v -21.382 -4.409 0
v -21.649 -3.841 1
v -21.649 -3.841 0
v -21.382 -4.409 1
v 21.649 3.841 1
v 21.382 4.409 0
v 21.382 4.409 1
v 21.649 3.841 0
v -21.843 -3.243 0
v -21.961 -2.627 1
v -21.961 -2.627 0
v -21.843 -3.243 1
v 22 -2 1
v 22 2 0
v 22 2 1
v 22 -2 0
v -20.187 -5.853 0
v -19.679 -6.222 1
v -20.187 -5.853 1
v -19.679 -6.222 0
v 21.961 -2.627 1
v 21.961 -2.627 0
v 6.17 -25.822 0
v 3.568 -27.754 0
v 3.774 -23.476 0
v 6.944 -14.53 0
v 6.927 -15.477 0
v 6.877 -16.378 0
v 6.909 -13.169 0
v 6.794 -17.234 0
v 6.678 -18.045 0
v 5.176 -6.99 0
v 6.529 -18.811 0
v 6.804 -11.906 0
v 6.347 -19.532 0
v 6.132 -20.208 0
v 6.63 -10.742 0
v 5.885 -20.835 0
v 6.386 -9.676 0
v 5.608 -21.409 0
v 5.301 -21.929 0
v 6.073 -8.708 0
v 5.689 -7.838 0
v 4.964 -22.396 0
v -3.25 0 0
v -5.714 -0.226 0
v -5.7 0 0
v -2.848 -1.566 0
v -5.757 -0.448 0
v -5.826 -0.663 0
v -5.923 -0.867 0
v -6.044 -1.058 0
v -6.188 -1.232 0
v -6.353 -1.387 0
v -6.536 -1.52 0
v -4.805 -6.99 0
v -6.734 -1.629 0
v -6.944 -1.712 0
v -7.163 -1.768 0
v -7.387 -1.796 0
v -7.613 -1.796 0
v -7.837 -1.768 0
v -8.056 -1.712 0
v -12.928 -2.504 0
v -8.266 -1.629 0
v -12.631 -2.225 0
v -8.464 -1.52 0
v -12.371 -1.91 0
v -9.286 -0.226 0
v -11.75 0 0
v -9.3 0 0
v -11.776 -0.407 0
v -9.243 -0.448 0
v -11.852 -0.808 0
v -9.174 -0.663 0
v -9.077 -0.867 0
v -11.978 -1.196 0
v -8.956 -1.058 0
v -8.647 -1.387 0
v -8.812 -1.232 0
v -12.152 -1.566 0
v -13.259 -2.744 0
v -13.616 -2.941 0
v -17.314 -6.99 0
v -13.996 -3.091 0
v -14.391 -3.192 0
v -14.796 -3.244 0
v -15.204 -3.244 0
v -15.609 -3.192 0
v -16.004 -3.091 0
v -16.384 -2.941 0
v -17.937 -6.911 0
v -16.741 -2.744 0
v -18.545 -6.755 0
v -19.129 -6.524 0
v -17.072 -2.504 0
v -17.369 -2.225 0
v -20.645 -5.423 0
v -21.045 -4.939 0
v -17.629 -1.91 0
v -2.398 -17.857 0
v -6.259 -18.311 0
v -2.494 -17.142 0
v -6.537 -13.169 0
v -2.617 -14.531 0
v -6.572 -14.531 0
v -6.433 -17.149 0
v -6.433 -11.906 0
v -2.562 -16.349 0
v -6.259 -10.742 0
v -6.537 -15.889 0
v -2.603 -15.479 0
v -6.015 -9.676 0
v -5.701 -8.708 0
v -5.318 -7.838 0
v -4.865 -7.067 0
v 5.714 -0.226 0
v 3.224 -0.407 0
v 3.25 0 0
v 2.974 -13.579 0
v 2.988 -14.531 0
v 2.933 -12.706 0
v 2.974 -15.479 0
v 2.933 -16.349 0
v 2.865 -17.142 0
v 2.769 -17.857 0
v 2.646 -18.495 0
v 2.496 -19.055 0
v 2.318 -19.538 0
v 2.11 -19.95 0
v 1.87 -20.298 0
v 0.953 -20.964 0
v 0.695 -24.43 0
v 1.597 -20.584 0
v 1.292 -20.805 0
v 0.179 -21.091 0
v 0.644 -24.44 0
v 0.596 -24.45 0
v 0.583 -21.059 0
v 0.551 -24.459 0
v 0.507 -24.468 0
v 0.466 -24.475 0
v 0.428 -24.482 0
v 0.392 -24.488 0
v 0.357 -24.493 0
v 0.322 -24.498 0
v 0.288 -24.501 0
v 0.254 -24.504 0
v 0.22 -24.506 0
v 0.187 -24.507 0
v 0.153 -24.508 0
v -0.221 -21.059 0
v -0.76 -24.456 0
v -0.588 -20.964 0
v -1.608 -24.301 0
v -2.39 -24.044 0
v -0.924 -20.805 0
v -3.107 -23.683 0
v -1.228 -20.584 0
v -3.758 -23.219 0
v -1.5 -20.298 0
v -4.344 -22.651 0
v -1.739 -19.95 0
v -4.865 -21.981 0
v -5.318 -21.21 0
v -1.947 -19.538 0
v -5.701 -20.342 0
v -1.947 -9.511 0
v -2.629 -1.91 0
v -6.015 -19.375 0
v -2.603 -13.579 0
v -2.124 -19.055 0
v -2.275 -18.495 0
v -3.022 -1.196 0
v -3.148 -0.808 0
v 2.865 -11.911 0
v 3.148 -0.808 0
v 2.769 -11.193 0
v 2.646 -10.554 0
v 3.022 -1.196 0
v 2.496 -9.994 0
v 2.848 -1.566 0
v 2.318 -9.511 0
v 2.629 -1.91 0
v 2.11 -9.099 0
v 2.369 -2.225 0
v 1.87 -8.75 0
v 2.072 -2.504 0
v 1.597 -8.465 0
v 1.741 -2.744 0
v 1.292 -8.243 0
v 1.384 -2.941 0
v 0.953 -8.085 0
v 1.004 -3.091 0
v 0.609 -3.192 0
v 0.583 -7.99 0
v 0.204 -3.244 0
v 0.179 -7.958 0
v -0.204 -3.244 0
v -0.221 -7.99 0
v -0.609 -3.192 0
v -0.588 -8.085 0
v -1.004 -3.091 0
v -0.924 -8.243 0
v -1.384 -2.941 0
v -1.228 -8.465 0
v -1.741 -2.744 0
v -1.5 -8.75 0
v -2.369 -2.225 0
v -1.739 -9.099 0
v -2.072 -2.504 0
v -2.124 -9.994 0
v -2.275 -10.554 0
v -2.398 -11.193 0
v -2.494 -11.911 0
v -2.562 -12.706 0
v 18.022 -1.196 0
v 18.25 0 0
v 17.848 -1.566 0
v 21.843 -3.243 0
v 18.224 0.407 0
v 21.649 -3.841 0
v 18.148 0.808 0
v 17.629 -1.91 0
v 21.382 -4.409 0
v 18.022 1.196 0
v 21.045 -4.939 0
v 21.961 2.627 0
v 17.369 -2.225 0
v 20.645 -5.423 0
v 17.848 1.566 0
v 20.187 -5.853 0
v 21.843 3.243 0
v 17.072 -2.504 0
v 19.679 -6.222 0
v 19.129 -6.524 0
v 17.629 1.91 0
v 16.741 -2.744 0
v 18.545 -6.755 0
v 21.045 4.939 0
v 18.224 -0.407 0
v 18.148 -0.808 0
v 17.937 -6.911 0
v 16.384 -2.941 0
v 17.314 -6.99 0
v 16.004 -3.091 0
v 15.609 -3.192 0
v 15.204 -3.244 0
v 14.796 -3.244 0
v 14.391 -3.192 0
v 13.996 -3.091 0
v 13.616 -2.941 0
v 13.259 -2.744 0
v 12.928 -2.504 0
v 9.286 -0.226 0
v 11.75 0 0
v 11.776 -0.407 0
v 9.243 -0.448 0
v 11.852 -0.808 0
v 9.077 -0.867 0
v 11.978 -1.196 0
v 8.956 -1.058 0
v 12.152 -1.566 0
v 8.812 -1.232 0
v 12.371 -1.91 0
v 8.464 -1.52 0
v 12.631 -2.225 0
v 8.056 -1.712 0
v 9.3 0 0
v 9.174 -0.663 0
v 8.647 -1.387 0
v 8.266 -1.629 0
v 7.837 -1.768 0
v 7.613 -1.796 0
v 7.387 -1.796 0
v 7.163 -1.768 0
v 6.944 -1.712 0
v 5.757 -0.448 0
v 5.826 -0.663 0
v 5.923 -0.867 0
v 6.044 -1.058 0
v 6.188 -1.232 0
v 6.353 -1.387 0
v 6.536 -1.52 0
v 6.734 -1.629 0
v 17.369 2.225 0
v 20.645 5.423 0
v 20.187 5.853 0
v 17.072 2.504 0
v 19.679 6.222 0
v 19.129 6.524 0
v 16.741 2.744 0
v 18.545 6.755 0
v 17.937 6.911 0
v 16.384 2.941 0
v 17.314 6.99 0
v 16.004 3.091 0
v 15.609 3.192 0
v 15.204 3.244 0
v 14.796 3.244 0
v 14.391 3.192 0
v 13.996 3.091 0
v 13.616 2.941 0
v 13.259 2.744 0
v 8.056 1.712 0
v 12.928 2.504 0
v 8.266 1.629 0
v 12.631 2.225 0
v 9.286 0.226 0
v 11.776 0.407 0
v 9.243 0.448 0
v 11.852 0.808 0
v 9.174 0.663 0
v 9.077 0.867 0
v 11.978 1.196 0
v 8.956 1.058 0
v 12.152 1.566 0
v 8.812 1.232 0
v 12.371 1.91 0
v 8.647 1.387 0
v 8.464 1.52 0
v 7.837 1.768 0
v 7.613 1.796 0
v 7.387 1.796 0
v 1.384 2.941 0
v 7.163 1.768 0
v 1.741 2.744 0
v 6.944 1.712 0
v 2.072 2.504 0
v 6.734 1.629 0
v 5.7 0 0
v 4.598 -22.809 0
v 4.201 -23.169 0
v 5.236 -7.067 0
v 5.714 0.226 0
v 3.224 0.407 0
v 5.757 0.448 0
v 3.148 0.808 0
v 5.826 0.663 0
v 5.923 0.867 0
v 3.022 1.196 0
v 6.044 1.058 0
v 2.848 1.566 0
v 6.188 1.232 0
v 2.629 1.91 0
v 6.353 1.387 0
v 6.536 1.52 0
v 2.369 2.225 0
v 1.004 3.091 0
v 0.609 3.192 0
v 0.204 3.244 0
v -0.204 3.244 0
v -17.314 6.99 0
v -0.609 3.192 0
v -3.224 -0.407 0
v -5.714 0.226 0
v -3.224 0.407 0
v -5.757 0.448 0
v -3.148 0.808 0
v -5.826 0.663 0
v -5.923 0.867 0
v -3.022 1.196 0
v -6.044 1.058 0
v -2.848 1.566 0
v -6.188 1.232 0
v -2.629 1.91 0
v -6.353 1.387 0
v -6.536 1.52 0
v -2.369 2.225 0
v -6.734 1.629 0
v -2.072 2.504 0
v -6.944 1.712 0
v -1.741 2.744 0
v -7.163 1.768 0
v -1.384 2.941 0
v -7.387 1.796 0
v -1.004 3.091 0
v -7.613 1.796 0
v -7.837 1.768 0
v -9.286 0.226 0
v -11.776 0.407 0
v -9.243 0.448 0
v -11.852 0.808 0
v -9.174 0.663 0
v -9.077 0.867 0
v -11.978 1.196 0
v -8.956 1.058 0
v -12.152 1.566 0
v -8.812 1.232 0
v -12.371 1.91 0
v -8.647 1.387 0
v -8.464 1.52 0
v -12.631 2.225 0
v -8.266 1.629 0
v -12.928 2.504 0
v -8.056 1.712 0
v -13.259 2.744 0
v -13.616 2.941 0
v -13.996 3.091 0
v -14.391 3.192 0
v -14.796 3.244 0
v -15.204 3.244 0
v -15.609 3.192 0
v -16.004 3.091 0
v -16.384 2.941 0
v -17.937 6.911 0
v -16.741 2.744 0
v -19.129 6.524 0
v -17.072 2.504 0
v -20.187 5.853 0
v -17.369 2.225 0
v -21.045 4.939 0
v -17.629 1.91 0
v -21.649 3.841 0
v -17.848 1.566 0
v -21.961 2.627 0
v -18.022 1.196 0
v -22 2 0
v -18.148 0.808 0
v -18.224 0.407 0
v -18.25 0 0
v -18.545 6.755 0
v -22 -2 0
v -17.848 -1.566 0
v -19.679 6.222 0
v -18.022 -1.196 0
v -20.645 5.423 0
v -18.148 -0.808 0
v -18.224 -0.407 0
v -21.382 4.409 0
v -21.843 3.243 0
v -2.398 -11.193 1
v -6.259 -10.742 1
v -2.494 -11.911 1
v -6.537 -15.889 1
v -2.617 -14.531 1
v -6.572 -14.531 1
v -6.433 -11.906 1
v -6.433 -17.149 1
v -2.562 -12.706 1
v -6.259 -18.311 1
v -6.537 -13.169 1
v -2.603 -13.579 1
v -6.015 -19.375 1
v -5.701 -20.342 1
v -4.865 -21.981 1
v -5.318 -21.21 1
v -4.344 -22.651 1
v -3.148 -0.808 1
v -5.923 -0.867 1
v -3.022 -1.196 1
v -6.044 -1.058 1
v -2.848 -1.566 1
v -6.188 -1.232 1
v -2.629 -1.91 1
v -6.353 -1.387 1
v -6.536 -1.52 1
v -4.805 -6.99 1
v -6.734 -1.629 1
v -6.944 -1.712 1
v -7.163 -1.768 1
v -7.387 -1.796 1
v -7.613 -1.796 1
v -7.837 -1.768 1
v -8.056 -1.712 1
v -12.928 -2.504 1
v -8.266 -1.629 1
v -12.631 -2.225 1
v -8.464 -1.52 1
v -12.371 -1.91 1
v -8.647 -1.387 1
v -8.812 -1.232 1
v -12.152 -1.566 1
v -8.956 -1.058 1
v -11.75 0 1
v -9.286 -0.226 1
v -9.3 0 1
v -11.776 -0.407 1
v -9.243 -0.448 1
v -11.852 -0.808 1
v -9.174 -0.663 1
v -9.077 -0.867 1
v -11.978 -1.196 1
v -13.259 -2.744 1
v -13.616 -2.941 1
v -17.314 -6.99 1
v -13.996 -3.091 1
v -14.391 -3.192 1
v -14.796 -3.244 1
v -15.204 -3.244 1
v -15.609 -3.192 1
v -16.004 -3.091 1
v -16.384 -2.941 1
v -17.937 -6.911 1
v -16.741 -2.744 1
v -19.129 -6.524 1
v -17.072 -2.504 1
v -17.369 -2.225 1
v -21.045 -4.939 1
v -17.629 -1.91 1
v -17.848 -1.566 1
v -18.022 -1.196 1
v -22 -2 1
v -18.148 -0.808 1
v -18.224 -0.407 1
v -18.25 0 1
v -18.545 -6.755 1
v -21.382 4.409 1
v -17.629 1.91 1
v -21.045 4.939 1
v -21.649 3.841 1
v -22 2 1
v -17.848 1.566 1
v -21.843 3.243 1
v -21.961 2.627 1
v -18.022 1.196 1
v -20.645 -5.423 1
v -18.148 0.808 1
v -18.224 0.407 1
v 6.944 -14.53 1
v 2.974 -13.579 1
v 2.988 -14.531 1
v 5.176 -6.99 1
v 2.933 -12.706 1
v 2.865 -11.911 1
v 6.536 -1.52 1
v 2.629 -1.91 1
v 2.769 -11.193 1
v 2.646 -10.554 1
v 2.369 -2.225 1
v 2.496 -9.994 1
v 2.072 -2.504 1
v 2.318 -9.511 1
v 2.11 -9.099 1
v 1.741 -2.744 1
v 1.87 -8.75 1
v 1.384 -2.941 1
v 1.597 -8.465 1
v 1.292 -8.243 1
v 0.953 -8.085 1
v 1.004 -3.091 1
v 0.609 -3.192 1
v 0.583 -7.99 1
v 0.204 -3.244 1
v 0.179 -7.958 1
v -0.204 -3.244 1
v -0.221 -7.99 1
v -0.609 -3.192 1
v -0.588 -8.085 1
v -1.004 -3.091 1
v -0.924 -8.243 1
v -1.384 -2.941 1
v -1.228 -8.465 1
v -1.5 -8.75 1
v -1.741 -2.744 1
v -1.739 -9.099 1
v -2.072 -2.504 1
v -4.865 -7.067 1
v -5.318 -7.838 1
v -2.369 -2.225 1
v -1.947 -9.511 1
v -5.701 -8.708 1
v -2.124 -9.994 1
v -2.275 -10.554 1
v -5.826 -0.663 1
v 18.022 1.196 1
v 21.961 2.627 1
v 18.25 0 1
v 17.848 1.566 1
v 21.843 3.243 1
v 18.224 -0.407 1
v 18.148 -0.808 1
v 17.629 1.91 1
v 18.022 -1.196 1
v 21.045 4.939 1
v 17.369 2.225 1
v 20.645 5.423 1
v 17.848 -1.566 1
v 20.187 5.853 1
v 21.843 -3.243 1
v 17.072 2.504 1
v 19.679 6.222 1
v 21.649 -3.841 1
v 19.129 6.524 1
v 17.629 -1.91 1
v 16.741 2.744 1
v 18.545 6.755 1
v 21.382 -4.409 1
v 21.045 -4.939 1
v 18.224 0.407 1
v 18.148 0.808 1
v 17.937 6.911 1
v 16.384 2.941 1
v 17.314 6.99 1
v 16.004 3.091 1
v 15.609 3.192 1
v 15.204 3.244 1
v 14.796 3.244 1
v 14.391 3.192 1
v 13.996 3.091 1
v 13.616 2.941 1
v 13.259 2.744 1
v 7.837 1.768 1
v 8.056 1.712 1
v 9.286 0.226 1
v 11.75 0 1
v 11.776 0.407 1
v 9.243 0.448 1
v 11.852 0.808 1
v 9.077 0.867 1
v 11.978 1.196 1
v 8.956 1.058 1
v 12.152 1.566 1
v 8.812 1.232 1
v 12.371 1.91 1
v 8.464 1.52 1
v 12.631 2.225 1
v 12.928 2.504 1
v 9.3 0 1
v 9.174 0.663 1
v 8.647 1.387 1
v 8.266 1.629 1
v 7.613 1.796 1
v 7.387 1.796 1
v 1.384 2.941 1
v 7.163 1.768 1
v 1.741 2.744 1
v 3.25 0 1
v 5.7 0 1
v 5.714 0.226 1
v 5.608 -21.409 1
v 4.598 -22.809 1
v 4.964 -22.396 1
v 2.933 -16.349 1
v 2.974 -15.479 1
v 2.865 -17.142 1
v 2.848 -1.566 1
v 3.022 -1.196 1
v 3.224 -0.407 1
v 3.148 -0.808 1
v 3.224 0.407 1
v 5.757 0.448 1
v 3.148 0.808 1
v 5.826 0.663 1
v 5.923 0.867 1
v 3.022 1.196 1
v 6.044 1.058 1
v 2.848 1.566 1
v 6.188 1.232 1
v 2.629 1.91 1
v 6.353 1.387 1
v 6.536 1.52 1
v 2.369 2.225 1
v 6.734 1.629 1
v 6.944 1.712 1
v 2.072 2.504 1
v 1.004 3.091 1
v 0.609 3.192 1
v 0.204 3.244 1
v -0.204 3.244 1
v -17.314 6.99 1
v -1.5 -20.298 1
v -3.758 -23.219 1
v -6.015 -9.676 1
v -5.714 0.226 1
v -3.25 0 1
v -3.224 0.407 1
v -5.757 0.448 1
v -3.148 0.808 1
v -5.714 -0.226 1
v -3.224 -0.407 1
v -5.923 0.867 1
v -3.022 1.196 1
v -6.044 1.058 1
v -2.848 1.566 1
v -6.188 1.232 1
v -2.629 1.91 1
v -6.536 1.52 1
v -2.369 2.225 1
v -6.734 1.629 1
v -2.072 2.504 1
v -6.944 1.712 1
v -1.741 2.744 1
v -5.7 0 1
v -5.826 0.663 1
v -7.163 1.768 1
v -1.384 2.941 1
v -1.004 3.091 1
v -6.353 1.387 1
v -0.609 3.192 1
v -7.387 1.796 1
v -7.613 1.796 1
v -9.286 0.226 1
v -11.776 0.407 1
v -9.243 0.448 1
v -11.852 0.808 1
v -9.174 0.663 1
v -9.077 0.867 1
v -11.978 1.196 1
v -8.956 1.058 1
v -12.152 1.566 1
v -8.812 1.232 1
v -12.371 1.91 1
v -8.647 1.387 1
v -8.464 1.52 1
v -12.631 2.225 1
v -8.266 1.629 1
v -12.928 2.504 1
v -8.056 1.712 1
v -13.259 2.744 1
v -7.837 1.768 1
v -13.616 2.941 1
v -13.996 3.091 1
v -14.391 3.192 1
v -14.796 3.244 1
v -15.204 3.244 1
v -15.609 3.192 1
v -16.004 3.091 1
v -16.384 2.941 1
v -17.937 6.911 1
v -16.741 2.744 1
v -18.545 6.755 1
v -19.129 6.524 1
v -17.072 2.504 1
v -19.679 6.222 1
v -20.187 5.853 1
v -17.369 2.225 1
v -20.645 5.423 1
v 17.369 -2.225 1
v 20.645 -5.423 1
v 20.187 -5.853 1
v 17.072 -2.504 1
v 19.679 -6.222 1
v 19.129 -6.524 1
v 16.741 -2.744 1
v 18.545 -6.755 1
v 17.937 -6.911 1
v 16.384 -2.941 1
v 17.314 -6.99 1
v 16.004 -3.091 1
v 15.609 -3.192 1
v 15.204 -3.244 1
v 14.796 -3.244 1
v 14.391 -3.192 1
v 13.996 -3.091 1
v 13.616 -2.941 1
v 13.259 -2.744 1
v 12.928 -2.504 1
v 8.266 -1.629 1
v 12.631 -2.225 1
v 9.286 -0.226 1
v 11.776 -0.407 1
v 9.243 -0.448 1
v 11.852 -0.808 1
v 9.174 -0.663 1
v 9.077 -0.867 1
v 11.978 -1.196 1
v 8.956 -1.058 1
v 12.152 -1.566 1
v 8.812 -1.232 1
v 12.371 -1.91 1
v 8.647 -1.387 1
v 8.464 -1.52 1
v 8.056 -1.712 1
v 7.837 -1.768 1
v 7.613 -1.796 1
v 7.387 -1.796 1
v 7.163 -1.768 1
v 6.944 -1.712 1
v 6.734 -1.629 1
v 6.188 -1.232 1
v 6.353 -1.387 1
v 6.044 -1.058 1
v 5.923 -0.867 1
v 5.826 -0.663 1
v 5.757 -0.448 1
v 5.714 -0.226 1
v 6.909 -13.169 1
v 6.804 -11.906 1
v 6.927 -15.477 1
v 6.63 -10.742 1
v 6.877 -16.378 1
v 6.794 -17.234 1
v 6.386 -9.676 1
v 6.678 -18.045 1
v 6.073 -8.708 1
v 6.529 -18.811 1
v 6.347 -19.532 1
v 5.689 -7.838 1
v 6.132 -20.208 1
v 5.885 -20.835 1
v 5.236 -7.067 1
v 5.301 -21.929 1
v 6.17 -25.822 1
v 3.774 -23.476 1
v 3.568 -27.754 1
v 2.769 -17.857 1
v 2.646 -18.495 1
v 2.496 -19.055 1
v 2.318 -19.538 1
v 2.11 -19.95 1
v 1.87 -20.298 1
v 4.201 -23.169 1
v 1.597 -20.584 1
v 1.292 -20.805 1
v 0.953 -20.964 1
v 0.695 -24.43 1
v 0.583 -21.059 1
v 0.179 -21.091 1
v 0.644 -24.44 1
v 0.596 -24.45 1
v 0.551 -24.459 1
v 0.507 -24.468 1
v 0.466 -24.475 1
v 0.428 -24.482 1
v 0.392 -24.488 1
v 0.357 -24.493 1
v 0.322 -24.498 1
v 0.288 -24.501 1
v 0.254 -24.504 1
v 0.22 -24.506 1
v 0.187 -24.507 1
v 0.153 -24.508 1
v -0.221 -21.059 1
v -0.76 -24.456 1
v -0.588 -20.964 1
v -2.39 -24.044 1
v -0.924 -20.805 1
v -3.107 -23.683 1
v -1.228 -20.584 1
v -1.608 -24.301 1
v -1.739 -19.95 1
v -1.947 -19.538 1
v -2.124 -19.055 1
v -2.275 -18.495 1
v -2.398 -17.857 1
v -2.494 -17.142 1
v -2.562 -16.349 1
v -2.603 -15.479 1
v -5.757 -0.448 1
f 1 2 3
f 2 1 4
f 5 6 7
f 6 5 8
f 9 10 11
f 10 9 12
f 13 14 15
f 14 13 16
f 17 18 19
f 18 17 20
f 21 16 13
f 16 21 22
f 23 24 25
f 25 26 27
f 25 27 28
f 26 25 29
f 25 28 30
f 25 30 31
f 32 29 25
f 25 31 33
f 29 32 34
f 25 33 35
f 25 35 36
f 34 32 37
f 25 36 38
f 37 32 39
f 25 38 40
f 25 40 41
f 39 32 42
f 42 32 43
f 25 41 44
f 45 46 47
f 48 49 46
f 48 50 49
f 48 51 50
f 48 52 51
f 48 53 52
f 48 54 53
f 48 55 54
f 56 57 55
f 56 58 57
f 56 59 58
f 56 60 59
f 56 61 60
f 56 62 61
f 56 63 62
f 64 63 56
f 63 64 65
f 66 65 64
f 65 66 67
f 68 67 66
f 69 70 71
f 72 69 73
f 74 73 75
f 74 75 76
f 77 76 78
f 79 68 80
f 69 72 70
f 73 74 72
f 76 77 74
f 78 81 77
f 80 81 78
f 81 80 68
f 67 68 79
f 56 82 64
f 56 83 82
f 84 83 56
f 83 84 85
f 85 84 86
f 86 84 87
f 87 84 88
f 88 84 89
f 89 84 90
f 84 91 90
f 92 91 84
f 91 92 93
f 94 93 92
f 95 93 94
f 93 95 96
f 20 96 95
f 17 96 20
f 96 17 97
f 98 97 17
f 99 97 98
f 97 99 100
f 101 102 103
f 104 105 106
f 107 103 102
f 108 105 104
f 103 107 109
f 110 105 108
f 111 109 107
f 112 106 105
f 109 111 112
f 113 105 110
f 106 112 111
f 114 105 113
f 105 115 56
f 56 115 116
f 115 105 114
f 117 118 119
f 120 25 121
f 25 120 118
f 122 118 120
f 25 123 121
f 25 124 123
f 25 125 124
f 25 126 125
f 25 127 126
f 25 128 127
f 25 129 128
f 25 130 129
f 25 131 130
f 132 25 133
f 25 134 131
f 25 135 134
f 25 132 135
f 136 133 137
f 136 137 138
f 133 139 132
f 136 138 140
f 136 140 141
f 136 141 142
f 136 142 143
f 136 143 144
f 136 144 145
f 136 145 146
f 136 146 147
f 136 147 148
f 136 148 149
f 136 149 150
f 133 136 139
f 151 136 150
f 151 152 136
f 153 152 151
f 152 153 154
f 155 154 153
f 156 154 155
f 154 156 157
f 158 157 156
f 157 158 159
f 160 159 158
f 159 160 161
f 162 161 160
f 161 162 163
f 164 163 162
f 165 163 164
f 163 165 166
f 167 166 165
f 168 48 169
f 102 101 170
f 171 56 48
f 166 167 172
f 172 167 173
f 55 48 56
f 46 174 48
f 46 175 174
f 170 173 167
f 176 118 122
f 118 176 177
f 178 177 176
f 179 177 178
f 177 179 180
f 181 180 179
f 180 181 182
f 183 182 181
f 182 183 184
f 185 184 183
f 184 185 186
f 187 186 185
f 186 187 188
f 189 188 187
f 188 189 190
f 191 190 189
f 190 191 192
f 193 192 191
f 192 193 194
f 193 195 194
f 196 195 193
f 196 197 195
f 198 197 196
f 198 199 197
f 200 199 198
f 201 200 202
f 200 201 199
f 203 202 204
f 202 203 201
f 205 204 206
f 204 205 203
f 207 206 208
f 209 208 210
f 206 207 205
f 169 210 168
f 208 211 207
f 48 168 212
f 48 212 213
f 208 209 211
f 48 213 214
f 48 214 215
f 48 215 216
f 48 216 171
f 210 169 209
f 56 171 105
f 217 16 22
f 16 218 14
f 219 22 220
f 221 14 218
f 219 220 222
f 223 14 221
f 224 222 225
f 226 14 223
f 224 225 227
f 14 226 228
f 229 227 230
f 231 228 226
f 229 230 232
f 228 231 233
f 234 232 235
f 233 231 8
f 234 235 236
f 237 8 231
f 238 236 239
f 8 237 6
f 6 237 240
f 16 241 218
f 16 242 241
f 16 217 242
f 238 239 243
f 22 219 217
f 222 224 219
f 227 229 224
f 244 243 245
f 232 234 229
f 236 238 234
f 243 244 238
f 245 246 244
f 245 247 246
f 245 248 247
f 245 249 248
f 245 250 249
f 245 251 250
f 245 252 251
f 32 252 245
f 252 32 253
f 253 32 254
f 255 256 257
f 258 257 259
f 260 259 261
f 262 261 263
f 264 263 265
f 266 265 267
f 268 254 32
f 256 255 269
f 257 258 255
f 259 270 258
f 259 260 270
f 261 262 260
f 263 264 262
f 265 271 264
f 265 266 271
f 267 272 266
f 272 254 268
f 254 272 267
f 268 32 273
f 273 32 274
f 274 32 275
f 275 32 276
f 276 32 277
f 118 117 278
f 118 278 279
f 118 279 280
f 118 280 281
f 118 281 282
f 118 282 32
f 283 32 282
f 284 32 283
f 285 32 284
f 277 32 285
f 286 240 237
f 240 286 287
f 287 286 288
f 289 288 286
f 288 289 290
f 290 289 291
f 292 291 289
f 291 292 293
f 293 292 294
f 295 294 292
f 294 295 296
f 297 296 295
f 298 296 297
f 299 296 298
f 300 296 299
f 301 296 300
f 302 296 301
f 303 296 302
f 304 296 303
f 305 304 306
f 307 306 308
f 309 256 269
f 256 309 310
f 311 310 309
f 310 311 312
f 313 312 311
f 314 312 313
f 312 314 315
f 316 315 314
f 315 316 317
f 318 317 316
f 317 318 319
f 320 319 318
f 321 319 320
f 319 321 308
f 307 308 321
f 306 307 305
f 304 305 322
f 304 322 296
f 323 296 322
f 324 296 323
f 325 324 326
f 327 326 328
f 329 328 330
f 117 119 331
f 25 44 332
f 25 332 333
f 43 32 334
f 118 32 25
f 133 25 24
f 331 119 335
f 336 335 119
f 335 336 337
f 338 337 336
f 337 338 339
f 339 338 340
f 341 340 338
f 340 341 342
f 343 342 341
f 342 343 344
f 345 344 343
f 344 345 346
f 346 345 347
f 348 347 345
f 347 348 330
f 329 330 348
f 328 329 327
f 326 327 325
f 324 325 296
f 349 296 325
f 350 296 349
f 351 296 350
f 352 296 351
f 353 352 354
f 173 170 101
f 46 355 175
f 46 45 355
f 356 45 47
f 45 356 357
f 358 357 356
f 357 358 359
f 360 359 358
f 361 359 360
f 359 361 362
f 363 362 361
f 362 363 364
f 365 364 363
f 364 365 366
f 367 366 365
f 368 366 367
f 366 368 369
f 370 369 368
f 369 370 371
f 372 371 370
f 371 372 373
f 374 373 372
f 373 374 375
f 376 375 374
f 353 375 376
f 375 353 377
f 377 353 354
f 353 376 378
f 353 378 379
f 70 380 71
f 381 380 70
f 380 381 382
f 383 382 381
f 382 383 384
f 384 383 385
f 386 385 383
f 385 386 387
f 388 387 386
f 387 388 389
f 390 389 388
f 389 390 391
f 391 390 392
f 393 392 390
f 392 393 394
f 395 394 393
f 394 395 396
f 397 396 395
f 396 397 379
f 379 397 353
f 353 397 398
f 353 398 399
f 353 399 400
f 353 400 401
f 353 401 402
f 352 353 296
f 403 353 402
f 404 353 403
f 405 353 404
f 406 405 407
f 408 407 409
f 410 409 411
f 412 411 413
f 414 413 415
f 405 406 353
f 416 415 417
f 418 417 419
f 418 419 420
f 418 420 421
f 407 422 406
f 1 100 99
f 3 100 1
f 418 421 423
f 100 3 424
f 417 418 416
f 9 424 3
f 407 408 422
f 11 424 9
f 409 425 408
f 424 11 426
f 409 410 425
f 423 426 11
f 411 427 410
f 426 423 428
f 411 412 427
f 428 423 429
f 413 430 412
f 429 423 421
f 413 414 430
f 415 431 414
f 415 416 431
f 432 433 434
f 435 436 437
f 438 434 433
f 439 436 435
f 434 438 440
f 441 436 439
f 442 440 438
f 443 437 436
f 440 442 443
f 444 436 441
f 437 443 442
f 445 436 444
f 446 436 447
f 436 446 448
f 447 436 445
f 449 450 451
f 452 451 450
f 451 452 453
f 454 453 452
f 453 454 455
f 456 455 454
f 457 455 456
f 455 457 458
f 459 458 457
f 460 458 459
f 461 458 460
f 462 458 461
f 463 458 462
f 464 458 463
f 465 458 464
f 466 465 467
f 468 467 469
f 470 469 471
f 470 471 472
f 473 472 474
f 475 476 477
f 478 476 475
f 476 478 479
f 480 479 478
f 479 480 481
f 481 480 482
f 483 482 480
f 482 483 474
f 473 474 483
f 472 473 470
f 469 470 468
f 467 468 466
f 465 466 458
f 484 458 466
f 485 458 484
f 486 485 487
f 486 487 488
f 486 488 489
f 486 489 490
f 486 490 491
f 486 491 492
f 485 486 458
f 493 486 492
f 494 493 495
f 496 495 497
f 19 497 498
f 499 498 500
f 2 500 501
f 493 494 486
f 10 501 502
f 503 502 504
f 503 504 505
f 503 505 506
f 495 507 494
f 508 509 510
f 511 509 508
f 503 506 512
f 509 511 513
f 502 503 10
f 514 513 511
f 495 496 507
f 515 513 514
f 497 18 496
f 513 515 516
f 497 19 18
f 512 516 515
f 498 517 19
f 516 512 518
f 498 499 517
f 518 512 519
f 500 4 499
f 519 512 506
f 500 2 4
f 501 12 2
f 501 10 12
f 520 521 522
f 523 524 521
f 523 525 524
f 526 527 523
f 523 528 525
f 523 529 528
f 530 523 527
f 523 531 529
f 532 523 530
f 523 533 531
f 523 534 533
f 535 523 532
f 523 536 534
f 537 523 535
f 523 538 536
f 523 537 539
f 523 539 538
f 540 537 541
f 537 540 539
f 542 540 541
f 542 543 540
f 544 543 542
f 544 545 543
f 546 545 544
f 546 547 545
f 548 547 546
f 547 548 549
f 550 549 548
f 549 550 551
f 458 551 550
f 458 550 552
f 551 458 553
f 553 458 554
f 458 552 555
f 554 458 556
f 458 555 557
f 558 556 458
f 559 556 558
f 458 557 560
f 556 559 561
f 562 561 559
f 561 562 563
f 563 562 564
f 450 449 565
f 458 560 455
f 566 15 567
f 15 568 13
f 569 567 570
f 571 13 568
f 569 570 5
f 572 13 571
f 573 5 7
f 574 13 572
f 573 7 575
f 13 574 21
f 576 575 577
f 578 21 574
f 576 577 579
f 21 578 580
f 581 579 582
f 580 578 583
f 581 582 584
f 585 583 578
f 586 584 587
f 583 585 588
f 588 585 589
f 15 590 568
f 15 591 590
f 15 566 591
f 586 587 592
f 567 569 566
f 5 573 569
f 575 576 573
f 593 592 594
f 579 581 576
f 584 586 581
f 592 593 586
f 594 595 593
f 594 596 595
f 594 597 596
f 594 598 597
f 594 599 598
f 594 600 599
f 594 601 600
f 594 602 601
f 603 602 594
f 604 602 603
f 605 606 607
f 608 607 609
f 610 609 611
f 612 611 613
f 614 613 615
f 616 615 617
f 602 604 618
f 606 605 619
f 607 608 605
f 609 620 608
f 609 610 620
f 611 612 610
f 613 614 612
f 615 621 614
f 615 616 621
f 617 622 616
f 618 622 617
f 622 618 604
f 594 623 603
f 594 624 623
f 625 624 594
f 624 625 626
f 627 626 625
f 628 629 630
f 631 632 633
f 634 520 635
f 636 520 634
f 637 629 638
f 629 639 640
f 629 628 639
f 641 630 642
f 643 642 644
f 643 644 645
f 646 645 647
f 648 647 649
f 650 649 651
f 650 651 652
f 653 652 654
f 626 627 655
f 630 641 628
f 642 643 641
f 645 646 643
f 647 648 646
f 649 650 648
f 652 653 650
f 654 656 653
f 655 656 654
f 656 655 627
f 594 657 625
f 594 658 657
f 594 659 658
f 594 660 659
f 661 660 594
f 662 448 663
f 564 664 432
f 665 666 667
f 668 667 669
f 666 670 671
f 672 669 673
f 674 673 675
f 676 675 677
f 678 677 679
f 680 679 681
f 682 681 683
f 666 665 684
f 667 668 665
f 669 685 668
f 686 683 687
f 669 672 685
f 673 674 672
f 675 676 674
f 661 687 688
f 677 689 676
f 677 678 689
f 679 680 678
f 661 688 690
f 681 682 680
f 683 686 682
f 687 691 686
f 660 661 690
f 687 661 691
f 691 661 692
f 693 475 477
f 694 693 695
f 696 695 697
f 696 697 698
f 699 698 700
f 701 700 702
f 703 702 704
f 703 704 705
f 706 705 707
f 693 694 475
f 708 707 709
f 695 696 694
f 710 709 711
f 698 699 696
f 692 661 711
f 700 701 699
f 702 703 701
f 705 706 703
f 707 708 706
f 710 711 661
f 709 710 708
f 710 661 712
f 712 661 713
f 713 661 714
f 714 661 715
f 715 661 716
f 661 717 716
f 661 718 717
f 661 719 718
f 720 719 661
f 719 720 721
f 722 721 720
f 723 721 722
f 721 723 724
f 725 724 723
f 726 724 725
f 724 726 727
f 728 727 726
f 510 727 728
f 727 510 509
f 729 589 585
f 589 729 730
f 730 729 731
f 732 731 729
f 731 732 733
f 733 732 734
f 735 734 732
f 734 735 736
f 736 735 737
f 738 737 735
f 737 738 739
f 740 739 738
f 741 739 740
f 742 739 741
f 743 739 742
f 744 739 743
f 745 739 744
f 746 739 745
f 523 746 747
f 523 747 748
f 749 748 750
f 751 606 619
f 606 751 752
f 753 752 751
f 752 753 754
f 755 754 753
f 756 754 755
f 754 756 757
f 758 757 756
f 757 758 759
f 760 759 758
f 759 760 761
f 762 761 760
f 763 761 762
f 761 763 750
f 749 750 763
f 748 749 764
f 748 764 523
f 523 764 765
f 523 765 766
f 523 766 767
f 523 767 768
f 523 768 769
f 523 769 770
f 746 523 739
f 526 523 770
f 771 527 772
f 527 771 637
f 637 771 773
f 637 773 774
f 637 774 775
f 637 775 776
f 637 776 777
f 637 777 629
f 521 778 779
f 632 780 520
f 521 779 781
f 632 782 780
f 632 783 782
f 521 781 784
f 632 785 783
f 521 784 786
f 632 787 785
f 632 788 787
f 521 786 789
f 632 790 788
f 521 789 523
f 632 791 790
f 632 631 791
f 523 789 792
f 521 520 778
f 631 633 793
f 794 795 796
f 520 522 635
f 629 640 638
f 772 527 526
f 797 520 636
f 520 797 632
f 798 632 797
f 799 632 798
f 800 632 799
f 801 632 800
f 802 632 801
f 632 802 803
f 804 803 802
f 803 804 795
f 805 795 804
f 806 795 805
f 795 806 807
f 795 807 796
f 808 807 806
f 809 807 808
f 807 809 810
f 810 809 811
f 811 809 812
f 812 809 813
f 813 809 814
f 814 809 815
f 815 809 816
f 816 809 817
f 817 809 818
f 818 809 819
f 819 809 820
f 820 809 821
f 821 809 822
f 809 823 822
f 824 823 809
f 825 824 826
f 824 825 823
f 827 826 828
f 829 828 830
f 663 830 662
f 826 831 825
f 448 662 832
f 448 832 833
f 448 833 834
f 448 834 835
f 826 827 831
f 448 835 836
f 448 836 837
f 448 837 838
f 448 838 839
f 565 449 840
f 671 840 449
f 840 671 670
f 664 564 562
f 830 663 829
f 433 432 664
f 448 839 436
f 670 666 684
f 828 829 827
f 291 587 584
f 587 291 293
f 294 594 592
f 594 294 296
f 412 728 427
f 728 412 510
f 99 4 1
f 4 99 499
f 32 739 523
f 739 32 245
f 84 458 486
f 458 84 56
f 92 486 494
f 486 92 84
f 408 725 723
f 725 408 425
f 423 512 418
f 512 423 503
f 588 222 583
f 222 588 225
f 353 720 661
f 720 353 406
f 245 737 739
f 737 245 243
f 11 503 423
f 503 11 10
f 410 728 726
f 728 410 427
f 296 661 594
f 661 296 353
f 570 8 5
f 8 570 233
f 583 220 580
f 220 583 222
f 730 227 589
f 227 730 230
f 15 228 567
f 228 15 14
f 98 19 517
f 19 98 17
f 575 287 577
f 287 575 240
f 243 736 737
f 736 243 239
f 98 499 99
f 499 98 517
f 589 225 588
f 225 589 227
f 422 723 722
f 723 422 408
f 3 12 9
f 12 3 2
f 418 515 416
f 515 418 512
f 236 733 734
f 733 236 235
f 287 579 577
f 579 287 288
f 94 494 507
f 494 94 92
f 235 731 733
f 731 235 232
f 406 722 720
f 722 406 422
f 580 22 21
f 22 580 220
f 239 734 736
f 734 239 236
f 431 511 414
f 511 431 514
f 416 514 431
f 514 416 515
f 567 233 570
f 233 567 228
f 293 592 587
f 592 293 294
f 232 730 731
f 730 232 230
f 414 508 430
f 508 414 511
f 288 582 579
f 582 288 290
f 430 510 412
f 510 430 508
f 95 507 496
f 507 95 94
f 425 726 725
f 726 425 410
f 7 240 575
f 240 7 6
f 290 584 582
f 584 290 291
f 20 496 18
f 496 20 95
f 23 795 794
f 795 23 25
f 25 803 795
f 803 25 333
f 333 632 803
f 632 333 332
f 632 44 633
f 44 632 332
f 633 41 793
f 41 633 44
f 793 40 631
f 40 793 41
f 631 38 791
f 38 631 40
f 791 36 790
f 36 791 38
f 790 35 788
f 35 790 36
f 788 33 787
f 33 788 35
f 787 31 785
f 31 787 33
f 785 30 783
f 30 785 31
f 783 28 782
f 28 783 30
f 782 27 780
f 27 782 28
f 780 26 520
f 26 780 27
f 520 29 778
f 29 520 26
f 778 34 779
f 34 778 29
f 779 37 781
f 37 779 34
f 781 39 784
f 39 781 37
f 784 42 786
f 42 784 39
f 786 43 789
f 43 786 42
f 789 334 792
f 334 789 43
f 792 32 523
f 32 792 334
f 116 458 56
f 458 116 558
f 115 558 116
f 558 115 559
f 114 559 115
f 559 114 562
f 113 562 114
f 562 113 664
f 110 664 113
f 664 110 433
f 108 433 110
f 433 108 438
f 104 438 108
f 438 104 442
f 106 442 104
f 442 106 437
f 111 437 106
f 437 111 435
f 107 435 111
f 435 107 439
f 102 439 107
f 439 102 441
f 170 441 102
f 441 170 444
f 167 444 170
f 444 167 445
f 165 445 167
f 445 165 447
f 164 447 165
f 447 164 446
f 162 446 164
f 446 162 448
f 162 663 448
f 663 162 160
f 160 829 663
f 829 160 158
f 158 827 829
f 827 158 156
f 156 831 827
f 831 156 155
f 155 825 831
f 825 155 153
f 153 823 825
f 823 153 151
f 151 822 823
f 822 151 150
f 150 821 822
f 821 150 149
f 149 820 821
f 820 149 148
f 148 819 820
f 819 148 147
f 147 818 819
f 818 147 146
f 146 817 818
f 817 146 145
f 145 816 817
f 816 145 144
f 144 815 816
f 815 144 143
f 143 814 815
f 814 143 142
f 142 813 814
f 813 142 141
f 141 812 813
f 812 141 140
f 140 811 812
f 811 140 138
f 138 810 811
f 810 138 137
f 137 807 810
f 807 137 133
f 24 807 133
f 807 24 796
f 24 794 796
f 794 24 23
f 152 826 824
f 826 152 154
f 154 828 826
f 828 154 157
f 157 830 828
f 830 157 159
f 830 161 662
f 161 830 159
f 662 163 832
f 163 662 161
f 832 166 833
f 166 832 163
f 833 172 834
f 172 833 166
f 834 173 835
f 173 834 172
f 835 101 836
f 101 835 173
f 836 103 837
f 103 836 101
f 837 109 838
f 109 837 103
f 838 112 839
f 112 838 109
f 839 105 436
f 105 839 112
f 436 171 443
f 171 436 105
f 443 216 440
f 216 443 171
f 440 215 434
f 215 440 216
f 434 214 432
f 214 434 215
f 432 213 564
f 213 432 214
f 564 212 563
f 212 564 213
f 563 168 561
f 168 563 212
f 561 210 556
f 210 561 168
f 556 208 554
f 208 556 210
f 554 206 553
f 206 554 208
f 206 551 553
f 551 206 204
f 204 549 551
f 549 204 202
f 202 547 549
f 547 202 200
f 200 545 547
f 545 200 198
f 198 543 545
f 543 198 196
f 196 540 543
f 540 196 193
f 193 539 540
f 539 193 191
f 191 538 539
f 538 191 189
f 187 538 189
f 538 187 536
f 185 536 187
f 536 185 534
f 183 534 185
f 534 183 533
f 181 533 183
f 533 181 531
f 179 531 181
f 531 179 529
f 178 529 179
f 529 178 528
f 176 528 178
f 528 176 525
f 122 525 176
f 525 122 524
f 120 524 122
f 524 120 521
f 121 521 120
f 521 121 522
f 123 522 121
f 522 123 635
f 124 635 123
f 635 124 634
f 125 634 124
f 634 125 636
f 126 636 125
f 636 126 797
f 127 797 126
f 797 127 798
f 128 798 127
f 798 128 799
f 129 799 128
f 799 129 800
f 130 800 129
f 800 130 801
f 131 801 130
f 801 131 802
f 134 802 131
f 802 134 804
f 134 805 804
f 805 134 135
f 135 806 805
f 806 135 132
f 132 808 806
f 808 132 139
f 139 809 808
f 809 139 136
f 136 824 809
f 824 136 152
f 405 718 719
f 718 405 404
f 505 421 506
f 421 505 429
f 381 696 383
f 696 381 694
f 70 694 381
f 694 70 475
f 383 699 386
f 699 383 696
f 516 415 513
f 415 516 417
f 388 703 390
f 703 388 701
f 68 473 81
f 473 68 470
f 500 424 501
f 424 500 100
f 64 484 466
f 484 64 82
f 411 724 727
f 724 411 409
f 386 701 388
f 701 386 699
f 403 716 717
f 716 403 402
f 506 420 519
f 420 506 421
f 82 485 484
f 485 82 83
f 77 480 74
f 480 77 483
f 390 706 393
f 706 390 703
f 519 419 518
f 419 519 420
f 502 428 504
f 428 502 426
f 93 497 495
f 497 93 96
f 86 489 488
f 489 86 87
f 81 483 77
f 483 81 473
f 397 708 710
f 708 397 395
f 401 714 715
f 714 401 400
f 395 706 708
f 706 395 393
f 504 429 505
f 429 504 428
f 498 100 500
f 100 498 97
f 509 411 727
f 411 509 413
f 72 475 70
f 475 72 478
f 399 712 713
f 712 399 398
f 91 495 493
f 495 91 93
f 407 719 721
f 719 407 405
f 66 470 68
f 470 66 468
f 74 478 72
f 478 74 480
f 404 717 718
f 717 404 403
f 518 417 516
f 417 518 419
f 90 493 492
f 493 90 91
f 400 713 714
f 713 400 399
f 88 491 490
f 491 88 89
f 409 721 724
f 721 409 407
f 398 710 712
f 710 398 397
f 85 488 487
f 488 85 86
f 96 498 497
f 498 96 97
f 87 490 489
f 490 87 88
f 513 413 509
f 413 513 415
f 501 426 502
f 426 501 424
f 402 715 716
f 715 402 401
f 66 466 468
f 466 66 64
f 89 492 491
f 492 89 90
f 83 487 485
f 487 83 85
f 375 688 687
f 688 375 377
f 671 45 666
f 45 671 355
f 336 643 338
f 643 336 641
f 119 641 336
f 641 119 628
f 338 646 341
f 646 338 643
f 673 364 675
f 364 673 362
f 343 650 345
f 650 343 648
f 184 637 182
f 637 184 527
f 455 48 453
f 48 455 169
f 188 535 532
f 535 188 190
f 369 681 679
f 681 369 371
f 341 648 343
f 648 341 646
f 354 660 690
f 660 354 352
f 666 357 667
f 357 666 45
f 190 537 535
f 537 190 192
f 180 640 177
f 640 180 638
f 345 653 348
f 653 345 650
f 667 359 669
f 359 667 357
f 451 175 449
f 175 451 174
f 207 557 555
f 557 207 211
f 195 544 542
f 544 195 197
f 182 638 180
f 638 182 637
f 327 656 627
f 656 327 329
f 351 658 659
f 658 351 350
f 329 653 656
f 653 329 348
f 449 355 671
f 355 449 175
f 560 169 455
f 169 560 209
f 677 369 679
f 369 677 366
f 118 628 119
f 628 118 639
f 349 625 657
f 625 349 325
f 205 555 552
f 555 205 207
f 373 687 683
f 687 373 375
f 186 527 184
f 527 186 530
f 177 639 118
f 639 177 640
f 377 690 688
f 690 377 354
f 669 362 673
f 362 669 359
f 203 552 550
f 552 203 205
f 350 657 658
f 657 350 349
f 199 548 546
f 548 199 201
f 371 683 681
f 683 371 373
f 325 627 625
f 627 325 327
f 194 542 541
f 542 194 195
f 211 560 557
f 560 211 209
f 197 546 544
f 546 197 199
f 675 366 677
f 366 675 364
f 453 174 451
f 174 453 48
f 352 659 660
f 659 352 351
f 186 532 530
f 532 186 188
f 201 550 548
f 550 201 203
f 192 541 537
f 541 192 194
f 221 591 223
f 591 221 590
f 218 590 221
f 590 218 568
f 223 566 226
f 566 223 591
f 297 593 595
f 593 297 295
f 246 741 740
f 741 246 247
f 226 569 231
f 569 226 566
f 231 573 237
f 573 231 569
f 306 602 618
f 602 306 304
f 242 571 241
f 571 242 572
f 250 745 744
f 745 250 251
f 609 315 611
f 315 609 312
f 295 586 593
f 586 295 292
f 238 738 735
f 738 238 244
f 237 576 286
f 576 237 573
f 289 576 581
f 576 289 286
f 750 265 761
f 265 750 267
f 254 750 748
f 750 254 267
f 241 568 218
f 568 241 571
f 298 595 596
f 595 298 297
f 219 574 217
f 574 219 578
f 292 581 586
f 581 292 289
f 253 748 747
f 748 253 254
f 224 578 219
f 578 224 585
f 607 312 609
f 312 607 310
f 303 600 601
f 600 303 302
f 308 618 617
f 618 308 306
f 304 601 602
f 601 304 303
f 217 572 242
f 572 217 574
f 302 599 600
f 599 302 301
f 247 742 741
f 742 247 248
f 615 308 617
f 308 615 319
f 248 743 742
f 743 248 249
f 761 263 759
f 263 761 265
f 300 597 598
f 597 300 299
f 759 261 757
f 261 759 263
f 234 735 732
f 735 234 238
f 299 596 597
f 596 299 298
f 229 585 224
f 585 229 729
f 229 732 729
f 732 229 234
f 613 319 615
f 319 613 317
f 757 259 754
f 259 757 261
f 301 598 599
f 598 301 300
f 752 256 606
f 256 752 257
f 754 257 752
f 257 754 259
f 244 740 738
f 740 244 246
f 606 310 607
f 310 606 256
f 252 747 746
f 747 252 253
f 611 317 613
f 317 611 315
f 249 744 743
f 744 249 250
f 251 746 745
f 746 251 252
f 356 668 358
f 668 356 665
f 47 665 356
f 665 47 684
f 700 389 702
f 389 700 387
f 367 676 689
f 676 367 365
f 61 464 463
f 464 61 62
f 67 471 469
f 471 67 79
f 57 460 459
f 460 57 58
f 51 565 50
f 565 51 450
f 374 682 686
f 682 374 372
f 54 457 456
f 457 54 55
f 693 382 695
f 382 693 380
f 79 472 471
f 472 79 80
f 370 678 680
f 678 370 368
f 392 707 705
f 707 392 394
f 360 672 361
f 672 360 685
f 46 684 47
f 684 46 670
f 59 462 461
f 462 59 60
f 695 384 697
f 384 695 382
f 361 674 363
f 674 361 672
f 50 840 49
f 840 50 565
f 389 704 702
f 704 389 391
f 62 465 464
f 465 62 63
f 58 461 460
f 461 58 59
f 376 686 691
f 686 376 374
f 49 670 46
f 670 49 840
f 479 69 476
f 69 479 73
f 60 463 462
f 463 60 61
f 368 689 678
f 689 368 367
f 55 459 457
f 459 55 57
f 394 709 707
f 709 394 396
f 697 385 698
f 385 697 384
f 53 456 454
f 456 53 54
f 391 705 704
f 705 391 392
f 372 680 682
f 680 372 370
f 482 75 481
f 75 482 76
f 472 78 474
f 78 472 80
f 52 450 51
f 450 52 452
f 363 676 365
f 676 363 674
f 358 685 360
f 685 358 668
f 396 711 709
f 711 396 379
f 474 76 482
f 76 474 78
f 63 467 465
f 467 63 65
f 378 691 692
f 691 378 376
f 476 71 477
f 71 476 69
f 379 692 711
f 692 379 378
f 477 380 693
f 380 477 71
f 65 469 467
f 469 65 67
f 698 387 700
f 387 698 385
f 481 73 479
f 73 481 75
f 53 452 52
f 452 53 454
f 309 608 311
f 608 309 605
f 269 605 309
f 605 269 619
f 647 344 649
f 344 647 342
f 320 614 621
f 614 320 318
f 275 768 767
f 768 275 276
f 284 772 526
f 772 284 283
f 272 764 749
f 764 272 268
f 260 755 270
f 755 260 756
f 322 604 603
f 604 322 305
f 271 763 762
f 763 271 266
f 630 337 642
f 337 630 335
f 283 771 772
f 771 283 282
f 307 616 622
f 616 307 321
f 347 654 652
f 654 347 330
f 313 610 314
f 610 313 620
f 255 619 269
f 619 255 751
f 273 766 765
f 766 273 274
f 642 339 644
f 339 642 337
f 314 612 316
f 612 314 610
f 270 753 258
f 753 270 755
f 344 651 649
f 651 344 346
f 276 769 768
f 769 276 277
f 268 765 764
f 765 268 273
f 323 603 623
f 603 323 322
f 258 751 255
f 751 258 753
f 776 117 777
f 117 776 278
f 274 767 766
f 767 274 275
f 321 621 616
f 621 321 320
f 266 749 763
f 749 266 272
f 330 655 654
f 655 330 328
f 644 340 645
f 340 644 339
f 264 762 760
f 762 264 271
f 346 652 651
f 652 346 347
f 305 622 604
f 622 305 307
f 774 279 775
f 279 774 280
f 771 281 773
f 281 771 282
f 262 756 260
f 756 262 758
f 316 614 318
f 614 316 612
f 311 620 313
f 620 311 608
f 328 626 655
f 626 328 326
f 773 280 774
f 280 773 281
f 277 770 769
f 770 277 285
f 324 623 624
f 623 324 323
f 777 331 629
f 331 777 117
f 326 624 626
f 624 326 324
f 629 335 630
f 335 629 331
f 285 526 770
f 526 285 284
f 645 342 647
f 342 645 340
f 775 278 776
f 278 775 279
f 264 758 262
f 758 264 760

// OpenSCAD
$fn = 50;


difference() {
	union() {
		hull() {
			translate(v = [-17.0000000000, 2.0000000000, 0]) {
				cylinder(h = 1, r = 5);
			}
			translate(v = [17.0000000000, 2.0000000000, 0]) {
				cylinder(h = 1, r = 5);
			}
			translate(v = [-17.0000000000, -2.0000000000, 0]) {
				cylinder(h = 1, r = 5);
			}
			translate(v = [17.0000000000, -2.0000000000, 0]) {
				cylinder(h = 1, r = 5);
			}
		}
		translate(v = [0, -5, 0]) {
			linear_extrude(height = 1) {
				text(font = "DejaVu Sans Mono:style=Bold", halign = "center", size = 19.0000000000, text = "Q", valign = "top");
			}
		}
	}
	union() {
		translate(v = [-15.0000000000, 0.0000000000, 0]) {
			translate(v = [0, 0, -100]) {
				cylinder(h = 200, r = 3.2500000000);
			}
		}
		translate(v = [0, 0, -100]) {
			cylinder(h = 200, r = 3.2500000000);
		}
		translate(v = [15.0000000000, 0.0000000000, 0]) {
			translate(v = [0, 0, -100]) {
				cylinder(h = 200, r = 3.2500000000);
			}
		}
		translate(v = [-15.0000000000, 0.0000000000, 0]) {
			translate(v = [0, 0, -100]) {
				cylinder(h = 200, r = 1.8000000000);
			}
		}
		translate(v = [-7.5000000000, 0.0000000000, 0]) {
			translate(v = [0, 0, -100]) {
				cylinder(h = 200, r = 1.8000000000);
			}
		}
		translate(v = [0, 0, -100]) {
			cylinder(h = 200, r = 1.8000000000);
		}
		translate(v = [7.5000000000, 0.0000000000, 0]) {
			translate(v = [0, 0, -100]) {
				cylinder(h = 200, r = 1.8000000000);
			}
		}
		translate(v = [15.0000000000, 0.0000000000, 0]) {
			translate(v = [0, 0, -100]) {
				cylinder(h = 200, r = 1.8000000000);
			}
		}
	}
}
